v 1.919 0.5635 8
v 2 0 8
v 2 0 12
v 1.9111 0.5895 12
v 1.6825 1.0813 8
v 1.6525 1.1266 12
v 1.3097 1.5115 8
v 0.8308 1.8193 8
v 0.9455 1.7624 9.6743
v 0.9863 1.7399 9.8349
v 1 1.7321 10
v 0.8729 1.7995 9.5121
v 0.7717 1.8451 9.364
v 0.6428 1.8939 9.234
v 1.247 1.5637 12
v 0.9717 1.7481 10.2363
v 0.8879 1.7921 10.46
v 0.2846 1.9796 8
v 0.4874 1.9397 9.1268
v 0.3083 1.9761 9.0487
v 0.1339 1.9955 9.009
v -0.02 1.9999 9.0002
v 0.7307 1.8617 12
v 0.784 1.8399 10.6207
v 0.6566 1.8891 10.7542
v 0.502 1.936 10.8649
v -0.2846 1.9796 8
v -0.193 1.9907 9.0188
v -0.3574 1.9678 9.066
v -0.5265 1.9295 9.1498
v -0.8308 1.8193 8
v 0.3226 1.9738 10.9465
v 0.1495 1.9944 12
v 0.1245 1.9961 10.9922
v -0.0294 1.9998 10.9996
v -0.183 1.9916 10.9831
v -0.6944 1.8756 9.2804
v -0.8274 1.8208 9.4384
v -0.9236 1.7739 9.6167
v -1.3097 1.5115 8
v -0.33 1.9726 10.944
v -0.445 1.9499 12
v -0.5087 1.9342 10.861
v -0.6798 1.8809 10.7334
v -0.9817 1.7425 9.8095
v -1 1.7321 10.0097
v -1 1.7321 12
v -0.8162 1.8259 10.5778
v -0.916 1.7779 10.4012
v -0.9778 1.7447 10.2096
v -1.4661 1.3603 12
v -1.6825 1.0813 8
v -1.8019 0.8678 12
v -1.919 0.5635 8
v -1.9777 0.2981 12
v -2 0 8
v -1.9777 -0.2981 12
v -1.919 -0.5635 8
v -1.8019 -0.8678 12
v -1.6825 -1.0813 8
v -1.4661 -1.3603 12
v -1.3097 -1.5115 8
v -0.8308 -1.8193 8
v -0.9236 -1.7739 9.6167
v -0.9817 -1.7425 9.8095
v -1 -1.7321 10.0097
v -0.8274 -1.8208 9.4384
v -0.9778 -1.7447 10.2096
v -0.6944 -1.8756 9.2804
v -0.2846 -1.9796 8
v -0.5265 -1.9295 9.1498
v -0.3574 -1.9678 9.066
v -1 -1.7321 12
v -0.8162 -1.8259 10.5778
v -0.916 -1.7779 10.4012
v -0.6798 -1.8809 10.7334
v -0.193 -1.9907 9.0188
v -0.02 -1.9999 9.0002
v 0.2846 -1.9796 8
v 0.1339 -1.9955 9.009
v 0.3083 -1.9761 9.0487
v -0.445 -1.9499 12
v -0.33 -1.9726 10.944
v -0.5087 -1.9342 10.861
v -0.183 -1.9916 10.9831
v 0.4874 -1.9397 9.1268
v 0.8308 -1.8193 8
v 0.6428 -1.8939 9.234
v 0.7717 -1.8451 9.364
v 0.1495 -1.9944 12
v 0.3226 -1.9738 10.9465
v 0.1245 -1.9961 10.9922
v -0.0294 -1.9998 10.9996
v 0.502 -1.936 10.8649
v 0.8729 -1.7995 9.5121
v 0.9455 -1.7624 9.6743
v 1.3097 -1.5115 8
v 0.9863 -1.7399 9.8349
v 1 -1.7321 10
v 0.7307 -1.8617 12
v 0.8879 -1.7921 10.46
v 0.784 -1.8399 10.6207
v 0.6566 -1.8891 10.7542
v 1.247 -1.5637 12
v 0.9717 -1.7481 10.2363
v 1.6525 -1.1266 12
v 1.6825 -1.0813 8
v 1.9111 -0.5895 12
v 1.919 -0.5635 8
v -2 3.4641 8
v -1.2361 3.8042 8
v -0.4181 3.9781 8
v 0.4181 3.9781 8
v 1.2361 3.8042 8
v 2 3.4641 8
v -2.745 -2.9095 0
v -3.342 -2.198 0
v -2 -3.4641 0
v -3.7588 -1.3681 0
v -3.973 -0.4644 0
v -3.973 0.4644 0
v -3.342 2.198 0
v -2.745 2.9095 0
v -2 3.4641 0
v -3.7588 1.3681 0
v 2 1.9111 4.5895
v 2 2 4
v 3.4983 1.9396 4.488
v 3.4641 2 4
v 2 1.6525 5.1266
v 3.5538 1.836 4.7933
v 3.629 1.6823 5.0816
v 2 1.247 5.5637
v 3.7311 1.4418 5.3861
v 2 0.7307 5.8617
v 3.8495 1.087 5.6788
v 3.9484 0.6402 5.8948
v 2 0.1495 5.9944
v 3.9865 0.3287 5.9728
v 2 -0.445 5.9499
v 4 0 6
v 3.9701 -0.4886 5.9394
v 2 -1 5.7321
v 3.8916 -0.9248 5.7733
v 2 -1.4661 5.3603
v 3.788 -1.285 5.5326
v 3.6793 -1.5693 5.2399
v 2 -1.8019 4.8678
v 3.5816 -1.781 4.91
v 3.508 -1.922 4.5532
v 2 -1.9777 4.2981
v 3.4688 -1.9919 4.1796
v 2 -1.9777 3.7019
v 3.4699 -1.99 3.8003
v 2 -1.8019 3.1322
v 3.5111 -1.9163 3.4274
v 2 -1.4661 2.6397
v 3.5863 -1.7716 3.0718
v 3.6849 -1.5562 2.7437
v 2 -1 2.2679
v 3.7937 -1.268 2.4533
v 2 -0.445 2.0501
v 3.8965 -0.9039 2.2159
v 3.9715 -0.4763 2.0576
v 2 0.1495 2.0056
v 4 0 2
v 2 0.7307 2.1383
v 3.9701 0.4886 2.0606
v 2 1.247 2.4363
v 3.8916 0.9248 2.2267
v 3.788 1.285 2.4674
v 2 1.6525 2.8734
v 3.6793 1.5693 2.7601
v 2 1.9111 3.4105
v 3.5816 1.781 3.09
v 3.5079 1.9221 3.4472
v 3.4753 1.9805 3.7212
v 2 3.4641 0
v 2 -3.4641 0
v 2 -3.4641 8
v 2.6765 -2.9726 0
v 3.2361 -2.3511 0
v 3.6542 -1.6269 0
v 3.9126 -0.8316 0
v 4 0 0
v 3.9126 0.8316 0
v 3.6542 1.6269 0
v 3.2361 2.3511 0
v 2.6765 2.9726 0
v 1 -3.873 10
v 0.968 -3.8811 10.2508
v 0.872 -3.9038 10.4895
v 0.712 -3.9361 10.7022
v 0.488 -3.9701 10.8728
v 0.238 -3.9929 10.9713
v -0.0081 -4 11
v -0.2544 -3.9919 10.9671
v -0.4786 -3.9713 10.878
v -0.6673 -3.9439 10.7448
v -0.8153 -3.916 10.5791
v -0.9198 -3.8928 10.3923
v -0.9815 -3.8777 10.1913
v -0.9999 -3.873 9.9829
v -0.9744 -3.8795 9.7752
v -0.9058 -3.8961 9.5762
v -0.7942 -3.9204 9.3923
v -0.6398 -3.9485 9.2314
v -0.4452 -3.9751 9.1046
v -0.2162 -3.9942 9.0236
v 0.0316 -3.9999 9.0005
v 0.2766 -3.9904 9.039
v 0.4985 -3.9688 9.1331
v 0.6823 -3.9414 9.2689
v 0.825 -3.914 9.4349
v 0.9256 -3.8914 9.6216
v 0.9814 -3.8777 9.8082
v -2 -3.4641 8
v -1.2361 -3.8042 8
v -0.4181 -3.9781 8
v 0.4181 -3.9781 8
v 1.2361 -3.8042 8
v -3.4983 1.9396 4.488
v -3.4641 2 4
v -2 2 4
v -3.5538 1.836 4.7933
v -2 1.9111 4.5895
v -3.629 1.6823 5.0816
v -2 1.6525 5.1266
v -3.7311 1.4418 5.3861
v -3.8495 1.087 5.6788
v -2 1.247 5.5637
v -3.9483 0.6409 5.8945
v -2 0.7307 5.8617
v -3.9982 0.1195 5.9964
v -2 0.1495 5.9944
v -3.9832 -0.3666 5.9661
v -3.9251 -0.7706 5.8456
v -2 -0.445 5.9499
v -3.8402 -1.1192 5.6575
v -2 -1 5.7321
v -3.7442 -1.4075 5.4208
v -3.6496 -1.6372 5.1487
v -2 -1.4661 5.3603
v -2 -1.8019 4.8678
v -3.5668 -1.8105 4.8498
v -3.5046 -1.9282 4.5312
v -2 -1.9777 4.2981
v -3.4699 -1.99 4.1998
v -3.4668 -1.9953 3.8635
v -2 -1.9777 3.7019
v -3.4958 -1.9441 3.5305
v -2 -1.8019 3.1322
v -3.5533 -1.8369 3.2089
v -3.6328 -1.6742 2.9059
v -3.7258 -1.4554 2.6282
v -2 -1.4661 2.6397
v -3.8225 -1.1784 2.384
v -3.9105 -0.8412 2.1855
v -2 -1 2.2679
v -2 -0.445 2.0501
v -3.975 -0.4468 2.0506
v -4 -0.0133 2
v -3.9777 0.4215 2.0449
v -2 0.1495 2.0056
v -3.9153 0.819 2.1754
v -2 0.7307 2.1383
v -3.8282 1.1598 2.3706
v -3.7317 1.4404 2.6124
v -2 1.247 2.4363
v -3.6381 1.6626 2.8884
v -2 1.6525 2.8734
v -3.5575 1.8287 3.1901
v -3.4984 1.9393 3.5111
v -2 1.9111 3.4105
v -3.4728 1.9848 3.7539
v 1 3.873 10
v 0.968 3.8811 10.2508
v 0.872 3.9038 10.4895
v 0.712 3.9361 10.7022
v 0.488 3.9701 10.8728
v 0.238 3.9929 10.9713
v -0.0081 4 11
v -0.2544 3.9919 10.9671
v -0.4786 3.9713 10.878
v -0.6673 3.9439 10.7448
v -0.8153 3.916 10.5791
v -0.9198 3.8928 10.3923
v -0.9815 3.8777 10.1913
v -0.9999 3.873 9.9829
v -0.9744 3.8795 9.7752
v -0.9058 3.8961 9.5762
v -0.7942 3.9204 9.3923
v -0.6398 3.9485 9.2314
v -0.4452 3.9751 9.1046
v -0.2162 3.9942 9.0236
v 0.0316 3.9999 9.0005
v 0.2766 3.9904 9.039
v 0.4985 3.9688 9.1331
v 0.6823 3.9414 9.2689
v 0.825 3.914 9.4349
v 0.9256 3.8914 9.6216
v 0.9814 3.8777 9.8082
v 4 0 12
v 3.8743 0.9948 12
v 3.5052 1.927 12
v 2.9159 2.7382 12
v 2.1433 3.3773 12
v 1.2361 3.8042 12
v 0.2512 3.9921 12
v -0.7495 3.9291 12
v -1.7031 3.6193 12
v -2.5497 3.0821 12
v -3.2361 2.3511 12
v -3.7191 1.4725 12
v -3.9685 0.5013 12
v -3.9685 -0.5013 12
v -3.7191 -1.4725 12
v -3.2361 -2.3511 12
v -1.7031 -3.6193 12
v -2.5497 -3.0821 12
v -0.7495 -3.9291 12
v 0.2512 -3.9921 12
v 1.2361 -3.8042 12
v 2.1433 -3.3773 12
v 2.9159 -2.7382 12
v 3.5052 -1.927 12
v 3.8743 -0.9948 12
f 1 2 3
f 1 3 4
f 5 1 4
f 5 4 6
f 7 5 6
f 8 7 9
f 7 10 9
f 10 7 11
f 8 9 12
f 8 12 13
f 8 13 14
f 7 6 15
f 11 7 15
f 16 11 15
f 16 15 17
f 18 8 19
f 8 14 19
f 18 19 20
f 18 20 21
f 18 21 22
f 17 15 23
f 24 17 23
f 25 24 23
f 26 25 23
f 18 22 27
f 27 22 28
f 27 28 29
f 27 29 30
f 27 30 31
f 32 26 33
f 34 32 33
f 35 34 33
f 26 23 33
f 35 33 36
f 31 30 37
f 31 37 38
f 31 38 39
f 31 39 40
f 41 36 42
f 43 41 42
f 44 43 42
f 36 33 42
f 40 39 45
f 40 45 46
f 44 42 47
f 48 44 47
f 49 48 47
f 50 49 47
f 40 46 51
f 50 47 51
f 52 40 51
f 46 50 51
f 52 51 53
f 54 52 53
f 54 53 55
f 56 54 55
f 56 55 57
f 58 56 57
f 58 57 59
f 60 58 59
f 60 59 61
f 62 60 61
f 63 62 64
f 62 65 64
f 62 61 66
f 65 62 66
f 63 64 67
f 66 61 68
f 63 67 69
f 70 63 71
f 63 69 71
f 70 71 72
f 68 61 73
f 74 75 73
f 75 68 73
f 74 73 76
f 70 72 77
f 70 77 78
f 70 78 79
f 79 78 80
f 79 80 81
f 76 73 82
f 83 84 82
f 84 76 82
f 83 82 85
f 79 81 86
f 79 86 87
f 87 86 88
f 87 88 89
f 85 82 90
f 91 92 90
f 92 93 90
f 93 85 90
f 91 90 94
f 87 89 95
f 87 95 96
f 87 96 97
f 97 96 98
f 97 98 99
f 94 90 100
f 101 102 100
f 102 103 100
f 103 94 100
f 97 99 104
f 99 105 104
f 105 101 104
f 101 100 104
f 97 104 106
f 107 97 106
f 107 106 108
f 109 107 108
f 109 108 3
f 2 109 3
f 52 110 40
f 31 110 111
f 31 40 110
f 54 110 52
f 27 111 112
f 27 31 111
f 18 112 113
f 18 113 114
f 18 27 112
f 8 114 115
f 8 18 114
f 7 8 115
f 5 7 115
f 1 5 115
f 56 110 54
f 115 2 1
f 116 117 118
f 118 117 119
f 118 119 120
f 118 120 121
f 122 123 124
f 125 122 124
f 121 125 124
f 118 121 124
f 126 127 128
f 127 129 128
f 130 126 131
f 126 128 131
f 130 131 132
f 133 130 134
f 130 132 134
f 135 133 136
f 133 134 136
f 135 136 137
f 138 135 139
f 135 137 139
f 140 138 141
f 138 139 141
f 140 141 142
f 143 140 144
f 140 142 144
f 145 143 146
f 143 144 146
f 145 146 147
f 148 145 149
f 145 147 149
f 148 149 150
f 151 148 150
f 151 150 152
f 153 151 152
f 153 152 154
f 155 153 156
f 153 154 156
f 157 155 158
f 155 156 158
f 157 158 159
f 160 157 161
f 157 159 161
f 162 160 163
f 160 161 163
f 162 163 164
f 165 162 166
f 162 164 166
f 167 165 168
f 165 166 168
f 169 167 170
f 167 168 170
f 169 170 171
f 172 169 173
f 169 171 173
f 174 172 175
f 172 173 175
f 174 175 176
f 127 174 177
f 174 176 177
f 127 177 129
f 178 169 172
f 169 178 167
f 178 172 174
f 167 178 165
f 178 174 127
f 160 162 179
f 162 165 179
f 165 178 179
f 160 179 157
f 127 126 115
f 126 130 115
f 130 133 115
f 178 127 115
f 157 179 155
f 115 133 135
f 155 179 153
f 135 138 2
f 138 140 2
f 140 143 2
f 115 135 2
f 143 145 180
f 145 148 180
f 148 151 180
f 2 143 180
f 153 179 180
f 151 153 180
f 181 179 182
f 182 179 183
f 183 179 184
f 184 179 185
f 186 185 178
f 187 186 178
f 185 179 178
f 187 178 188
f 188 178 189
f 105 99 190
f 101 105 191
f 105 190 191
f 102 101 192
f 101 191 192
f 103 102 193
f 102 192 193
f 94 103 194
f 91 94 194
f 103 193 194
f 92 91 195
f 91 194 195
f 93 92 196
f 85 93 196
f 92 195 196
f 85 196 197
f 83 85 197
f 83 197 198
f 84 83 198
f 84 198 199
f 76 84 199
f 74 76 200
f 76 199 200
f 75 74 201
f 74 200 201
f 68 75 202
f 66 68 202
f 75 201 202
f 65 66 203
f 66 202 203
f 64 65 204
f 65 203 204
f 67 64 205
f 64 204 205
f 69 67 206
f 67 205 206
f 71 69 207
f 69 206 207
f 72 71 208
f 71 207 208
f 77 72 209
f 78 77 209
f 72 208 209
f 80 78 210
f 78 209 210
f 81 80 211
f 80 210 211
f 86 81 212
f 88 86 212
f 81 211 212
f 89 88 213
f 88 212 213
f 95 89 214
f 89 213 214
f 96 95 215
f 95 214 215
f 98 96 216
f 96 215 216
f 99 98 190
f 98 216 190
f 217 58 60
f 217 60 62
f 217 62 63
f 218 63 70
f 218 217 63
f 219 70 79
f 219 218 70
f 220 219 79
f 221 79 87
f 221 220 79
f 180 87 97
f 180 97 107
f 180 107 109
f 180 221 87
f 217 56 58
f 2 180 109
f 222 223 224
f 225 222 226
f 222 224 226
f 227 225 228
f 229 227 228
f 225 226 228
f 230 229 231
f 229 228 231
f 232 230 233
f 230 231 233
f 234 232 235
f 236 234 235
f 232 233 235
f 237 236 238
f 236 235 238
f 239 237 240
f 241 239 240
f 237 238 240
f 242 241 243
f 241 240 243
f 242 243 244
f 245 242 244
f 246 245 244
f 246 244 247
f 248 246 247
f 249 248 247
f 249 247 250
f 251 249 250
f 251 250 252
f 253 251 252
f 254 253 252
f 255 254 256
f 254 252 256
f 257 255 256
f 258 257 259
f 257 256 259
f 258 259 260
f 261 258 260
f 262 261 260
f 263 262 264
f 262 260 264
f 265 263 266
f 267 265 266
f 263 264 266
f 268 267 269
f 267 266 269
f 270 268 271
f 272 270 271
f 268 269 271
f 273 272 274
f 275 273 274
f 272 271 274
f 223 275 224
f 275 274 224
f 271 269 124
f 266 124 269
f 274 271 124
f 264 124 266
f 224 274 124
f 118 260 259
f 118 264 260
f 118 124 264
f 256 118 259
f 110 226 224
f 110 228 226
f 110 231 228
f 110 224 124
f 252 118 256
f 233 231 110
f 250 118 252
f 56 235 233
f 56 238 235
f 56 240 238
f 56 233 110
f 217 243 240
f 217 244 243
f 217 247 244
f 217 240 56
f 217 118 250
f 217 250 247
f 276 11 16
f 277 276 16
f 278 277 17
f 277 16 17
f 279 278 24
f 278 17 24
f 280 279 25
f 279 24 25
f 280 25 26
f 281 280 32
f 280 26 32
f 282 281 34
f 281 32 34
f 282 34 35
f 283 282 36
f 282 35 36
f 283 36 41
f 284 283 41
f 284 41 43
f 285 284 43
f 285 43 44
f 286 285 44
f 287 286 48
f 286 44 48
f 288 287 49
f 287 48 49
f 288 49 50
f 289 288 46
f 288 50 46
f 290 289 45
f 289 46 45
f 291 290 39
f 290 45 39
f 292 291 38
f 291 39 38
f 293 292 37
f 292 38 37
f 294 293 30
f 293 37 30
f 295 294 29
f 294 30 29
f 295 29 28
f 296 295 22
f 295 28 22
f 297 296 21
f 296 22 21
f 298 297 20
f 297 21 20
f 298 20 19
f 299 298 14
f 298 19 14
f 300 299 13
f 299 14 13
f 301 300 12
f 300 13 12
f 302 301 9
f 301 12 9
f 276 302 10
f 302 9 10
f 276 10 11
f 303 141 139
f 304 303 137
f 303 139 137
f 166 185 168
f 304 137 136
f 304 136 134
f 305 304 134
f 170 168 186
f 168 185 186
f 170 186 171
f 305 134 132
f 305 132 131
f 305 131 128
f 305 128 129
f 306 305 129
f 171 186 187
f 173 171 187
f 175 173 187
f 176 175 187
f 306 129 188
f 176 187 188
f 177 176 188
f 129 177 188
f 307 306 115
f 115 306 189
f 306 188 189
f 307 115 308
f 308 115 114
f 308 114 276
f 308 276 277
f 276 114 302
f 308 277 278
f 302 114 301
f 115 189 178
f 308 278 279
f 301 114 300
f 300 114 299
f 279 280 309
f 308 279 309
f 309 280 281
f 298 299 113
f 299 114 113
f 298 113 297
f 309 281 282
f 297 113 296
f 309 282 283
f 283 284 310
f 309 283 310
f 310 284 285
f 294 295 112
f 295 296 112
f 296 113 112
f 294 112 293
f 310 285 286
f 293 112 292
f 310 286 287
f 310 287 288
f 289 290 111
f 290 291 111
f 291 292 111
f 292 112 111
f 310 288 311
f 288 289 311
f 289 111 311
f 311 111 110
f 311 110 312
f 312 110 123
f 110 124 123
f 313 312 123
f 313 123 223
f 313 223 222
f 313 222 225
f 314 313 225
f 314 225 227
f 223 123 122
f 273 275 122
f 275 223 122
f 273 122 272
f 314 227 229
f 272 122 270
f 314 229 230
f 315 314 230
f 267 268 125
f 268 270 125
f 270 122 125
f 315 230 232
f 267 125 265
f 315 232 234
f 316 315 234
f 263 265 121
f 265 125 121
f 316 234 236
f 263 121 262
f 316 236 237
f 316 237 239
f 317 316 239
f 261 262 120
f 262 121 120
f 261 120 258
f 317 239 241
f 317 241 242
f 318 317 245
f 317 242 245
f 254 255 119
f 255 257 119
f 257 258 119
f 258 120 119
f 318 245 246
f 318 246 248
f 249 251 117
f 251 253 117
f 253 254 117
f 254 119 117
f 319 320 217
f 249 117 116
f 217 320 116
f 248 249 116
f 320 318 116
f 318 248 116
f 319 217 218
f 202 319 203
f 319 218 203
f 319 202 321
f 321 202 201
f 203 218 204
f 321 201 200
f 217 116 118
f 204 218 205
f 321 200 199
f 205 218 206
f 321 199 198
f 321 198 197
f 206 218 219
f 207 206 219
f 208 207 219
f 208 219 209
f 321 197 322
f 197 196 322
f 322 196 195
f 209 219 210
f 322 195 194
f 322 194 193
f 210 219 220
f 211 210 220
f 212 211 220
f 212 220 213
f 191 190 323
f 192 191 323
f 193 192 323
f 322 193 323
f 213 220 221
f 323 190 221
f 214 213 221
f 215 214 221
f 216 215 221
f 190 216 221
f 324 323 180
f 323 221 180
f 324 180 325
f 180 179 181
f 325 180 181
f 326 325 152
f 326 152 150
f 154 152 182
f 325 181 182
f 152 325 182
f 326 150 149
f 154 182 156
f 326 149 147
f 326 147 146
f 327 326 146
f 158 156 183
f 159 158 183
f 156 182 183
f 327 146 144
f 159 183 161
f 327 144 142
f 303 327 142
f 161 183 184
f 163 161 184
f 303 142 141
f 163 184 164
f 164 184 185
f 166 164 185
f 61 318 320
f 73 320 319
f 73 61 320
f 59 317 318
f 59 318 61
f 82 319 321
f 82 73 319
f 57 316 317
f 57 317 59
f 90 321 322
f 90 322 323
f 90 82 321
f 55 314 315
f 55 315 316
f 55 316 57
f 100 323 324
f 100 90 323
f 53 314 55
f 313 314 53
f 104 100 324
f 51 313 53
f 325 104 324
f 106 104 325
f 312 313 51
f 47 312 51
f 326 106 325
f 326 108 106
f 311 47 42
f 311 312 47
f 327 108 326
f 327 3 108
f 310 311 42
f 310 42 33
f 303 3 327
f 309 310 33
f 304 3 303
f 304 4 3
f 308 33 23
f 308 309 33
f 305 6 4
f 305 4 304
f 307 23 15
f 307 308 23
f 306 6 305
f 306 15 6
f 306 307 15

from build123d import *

# Parameters (mm, degrees)
F0_R     = 4
F1_DEPTH = 12
F2_W     = 4
F2_H     = 8
F3_DEPTH = 12.5
F4_R     = 1
F5_DEPTH = 12.5
F6_R     = 2
F7_DEPTH = 12.001
F8_R     = 2
F9_DEPTH = 12.5


with BuildPart() as f1:
    # F0 (on Top) → F1 (new body)
    with BuildSketch(Plane.XY):
        Circle(F0_R)
    extrude(amount=F1_DEPTH)

    # F2 (on Front) → F3 (cut, symmetric)
    with BuildSketch(Plane.XZ):
        with Locations((0, 4)):
            Rectangle(F2_W, F2_H)
    extrude(amount=F3_DEPTH, both=True, mode=Mode.SUBTRACT)

    # F4 (on Front) → F5 (cut, symmetric)
    with BuildSketch(Plane.XZ):
        with Locations((0, 10)):
            Circle(F4_R)
    extrude(amount=F5_DEPTH, both=True, mode=Mode.SUBTRACT)

    # F6 (on face) → F7 (cut, through all)
    with BuildSketch(Plane.XY.offset(12)):
        Circle(F6_R)
    extrude(amount=-F7_DEPTH, mode=Mode.SUBTRACT)

    # F8 (on Right) → F9 (cut, symmetric)
    with BuildSketch(Plane.YZ):
        with Locations((0, 4)):
            Circle(F8_R)
    extrude(amount=F9_DEPTH, both=True, mode=Mode.SUBTRACT)


solid = f1.part
